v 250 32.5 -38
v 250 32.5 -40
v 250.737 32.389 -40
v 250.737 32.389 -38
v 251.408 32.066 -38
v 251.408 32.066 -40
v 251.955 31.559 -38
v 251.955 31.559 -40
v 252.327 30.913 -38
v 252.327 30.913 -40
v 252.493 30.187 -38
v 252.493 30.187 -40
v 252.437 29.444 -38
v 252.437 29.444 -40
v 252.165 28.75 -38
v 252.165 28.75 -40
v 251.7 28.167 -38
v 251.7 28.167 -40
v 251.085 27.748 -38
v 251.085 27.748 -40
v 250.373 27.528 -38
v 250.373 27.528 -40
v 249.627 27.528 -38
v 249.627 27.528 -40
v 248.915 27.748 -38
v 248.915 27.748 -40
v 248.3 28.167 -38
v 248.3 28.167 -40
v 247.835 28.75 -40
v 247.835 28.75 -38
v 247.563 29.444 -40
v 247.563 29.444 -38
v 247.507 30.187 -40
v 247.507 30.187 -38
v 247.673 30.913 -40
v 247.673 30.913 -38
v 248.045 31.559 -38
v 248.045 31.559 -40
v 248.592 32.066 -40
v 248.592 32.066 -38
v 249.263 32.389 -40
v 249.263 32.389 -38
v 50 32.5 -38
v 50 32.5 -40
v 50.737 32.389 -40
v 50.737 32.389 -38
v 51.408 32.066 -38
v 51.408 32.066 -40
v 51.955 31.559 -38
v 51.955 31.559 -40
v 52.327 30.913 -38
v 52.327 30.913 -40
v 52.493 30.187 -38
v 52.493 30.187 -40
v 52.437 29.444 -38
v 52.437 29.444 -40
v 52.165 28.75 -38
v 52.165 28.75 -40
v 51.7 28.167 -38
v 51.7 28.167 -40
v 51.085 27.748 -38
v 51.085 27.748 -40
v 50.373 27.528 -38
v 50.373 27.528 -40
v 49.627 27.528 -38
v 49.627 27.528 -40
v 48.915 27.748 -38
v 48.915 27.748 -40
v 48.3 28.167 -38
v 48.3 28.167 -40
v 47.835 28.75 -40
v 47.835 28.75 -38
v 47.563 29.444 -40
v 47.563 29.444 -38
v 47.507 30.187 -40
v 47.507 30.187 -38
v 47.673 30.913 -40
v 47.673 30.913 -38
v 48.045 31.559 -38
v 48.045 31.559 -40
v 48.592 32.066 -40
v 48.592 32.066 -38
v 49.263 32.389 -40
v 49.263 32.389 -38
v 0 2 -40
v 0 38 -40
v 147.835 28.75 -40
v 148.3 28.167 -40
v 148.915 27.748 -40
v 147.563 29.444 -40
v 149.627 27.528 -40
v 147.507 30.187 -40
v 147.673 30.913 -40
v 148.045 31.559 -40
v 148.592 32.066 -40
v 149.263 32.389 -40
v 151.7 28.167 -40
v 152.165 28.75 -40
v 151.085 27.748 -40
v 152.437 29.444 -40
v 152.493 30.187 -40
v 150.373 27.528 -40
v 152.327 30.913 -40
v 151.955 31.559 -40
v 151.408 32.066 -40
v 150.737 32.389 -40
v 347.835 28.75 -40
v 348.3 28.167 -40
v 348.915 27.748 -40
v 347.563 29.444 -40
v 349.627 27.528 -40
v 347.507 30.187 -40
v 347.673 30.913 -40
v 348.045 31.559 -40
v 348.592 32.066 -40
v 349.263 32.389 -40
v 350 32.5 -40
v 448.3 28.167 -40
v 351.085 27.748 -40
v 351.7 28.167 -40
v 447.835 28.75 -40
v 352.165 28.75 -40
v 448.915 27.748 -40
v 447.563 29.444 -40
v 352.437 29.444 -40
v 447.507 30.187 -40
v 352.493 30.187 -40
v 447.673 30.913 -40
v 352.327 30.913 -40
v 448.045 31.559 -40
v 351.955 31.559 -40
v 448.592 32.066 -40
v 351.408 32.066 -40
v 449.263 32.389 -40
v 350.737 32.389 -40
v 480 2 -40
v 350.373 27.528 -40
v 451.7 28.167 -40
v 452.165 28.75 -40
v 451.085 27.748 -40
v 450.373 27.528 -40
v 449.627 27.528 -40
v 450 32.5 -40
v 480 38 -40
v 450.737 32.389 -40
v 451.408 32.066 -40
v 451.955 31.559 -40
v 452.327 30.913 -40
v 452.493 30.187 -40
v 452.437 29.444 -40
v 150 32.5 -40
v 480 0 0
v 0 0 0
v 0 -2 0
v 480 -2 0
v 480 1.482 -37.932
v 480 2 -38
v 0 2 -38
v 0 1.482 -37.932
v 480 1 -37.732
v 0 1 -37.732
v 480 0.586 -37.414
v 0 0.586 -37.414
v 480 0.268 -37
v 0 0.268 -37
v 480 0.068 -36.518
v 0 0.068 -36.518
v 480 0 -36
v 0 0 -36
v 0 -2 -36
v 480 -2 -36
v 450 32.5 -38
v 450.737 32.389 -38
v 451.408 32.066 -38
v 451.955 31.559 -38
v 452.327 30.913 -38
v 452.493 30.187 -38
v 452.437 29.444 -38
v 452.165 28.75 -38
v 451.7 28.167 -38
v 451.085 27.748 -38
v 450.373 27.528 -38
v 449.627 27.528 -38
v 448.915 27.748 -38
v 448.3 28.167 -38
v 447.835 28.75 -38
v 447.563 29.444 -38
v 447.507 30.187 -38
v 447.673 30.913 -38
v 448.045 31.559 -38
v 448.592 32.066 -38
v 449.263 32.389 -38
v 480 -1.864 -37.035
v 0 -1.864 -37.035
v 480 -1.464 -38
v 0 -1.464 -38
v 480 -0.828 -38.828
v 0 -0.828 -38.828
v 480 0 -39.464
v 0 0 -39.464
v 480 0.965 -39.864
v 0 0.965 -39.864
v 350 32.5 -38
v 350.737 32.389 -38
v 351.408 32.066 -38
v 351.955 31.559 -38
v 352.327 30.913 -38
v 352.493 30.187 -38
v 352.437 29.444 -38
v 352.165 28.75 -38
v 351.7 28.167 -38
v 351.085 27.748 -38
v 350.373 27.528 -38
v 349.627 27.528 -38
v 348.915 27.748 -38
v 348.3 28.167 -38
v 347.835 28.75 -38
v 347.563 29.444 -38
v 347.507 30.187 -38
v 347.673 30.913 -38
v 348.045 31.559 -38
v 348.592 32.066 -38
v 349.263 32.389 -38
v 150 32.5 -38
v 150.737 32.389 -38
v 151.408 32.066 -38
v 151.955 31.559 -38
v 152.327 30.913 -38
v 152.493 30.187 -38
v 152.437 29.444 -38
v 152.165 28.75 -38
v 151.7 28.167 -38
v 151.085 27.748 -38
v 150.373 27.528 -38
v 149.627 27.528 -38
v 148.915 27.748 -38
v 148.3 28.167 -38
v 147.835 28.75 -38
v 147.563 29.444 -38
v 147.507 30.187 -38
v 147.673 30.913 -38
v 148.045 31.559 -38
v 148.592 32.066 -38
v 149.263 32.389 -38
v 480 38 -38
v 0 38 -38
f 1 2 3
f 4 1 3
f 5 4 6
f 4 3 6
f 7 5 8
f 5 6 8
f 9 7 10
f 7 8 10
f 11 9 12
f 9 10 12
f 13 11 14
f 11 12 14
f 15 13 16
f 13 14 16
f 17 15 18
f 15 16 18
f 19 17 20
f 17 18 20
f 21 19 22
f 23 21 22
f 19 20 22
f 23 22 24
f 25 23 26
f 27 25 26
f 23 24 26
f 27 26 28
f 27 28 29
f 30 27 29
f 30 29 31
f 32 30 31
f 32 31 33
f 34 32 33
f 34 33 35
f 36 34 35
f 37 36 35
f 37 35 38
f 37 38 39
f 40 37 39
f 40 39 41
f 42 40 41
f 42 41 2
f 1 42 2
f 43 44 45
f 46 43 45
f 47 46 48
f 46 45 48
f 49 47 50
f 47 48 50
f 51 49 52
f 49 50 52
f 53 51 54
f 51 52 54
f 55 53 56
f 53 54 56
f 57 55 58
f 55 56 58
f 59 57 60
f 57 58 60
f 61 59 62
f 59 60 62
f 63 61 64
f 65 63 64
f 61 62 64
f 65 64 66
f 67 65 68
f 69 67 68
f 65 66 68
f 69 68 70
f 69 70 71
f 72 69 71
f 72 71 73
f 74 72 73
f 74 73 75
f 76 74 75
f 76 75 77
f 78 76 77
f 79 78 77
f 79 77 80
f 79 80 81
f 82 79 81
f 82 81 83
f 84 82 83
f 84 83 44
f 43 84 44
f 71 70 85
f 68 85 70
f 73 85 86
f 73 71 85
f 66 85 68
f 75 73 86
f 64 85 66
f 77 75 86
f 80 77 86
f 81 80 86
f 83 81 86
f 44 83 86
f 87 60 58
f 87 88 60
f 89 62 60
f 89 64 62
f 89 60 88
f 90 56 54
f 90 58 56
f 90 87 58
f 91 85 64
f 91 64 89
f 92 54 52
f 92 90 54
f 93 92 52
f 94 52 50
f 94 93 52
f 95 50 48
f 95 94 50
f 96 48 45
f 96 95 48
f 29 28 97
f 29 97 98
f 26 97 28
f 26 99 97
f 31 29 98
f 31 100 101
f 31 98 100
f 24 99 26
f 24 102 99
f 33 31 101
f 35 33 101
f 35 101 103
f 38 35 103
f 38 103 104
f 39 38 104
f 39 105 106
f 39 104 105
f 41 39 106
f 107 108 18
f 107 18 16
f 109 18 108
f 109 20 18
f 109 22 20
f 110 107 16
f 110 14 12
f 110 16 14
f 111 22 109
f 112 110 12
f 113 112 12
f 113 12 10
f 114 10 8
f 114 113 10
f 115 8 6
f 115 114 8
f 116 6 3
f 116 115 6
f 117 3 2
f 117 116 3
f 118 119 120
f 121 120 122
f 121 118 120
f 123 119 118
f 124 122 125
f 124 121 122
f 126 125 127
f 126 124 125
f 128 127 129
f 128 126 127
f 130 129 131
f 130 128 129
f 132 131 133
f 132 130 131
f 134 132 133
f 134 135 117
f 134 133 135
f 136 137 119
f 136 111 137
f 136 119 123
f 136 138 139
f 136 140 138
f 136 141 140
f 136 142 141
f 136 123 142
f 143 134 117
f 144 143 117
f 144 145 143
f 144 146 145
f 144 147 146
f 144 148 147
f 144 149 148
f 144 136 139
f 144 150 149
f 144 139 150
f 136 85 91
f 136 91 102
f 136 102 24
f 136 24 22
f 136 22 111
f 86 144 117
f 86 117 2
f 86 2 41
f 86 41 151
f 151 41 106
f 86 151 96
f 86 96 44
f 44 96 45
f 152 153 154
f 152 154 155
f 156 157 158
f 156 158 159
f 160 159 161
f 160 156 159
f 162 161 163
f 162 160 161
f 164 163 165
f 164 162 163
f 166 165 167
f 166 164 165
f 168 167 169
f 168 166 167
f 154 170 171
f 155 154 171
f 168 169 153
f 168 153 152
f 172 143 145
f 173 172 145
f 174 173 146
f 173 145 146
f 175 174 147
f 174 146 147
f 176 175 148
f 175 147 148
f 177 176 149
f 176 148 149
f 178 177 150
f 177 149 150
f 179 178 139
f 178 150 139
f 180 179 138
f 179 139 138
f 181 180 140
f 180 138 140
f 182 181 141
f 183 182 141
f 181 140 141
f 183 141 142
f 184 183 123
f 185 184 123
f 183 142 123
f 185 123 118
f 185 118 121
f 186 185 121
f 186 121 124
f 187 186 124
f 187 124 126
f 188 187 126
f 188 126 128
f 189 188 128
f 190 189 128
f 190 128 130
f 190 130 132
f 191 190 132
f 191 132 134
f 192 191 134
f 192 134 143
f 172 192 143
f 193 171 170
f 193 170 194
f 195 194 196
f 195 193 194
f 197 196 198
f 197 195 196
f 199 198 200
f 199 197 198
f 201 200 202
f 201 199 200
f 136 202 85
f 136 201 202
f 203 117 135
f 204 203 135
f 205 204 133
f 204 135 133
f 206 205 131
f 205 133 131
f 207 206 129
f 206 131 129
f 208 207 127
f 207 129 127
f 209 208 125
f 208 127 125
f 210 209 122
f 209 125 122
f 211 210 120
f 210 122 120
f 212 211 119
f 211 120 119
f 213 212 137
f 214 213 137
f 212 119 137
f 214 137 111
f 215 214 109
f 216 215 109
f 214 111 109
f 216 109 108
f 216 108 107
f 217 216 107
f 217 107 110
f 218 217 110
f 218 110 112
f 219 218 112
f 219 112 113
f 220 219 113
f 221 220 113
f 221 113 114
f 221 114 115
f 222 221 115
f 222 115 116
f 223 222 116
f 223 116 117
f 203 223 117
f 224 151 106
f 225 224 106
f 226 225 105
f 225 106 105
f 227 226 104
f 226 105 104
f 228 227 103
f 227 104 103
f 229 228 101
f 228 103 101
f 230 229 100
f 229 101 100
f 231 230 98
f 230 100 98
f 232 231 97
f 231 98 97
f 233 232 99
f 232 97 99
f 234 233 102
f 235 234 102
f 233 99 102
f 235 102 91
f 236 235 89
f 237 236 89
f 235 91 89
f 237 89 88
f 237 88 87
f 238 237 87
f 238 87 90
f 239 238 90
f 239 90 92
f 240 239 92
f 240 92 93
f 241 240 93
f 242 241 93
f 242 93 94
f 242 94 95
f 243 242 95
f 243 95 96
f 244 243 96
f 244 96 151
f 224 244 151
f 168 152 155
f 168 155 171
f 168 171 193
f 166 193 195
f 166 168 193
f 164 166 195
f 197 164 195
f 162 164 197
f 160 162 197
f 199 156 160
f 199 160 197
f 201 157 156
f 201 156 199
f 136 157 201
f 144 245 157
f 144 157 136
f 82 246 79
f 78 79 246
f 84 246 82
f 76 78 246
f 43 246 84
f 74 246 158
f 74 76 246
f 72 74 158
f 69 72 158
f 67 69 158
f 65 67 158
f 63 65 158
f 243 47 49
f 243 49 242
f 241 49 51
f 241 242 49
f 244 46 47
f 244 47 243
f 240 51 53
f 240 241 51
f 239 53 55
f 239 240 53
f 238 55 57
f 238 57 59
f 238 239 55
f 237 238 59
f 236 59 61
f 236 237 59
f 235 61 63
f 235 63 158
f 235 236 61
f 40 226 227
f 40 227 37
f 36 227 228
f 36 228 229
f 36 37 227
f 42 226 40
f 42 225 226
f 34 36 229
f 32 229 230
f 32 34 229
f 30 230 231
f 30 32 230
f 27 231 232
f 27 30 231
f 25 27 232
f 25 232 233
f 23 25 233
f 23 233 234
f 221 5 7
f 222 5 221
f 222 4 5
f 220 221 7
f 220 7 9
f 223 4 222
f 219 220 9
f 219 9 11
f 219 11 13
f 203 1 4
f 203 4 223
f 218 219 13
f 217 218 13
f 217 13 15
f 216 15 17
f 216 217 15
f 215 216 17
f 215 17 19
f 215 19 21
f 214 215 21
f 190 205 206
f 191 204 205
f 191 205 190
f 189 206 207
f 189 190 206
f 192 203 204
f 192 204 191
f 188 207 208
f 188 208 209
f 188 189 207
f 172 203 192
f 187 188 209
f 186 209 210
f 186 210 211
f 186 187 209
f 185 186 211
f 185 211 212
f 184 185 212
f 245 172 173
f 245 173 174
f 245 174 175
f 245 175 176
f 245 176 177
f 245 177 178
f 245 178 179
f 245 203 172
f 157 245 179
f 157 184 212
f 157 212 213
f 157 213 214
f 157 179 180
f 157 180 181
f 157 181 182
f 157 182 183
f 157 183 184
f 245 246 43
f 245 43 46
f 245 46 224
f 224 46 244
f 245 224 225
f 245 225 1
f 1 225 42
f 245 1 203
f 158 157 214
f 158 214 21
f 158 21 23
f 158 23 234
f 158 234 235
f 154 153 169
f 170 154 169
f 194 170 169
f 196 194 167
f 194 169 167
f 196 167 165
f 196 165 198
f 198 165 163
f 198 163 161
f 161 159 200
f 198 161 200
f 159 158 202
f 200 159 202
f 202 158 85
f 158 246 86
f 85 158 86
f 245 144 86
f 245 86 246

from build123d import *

# Parameters (mm, degrees)
SKETCH_1_W                       = 480
SKETCH_1_H                       = 40
SM_BASE_FLANGE_1_DEPTH           = 2
SM_EDGE_FLANGE_1_STRIP_W         = 12
SM_EDGE_FLANGE_1_STRIP_H         = 2
SM_EDGE_FLANGE_1_STRIP_CUT_DEPTH = 480
SM_EDGE_FLANGE_1_DEPTH           = 480
SKETCH_9_R                       = 2.5
CUT_EXTRUDE_1_DEPTH              = 484.160428843


# Sheet-metal steps are written as plain solids
with BuildPart() as part:
    # Sketch 1 → Базовая кромка1 (new body)
    with BuildSketch(Plane(origin=(0, 0, 0), x_dir=(1, 0, 0), z_dir=(0, 1, 0))):
        with Locations((240, 20)):
            Rectangle(SKETCH_1_W, SKETCH_1_H)
    extrude(amount=-SM_BASE_FLANGE_1_DEPTH)

    # Ребро-кромка1 strip (across the edge) → Ребро-кромка1 strip cut (cut)
    with BuildSketch(Plane(origin=(480, 0, -40), x_dir=(0, 0, 1), z_dir=(-1, 0, 0))):
        with Locations((-2, -1)):
            Rectangle(SM_EDGE_FLANGE_1_STRIP_W, SM_EDGE_FLANGE_1_STRIP_H)
    extrude(amount=SM_EDGE_FLANGE_1_STRIP_CUT_DEPTH, mode=Mode.SUBTRACT)

    # Ребро-кромка1 section (across the edge) → Ребро-кромка1 (add)
    with BuildSketch(Plane(origin=(480, 0, -40), x_dir=(0, 0, 1), z_dir=(-1, 0, 0))):
        with BuildLine():
            Line((0, 2), (0, 38))
            Line((0, 38), (2, 38))
            Line((2, 38), (2, 2))
            ThreePointArc((2, 2), (2.585786438, 0.585786438), (4, 0))
            Line((4, 0), (4, -2))
            ThreePointArc((4, -2), (1.171572875, -0.828427125), (0, 2))
        make_face()
    extrude(amount=SM_EDGE_FLANGE_1_DEPTH)

    # Эскиз9 → Вырез-Вытянуть1 (cut, through all)
    with BuildSketch(Plane(origin=(0, 0, -40), x_dir=(-1, 0, 0), z_dir=(0, 0, -1))):
        with Locations(Location((-450, 30, 0), (0, 0, 90))):
            Circle(SKETCH_9_R)
        with Locations(Location((-350, 30, 0), (0, 0, 90))):
            Circle(SKETCH_9_R)
        with Locations(Location((-250, 30, 0), (0, 0, 90))):
            Circle(SKETCH_9_R)
        with Locations(Location((-150, 30, 0), (0, 0, 90))):
            Circle(SKETCH_9_R)
        with Locations(Location((-50, 30, 0), (0, 0, 90))):
            Circle(SKETCH_9_R)
    extrude(amount=-CUT_EXTRUDE_1_DEPTH, mode=Mode.SUBTRACT)


solid = part.part
